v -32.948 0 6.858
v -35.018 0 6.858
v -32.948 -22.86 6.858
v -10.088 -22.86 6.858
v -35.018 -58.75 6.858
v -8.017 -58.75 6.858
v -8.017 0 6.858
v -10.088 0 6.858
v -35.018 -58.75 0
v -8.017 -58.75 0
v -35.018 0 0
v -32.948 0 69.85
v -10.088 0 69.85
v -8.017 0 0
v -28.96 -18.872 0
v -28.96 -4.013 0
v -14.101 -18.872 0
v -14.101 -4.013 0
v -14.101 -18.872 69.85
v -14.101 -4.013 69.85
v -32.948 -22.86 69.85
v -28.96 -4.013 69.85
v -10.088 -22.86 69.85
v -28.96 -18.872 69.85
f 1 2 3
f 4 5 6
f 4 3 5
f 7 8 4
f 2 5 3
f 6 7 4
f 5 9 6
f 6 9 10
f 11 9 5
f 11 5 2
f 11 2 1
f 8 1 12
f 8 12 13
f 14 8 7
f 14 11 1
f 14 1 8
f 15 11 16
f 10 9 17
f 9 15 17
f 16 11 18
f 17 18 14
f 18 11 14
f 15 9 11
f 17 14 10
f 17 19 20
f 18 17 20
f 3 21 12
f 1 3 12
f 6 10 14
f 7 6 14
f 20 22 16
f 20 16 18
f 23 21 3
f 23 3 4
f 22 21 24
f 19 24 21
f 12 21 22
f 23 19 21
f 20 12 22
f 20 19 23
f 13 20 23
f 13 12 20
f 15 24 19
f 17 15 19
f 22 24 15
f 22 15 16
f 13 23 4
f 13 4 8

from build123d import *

# Parameters (mm, degrees)
F0_W     = 27.0002
F0_H     = 58.7502
F1_DEPTH = 6.858
F2_W     = 11.43
F2_H     = 22.86
F3_DEPTH = 69.85
F4_W     = 14.859
F4_H     = 14.859
F5_DEPTH = 76.2


with BuildPart() as f1:
    # F0 (on Top) → F1 (new body)
    with BuildSketch(Plane.XY):
        with Locations((-21.517536, -29.3751)):
            Rectangle(F0_W, F0_H)
    extrude(amount=F1_DEPTH)

    # F2 (on Top) → F3 (join)
    with BuildSketch(Plane.XY):
        with Locations((-27.232536, -11.43)):
            Rectangle(F2_W, F2_H)
        with Locations((-15.802536, -11.43)):
            Rectangle(F2_W, F2_H)
    extrude(amount=F3_DEPTH)

    # F4 (on face) → F5 (cut)
    with BuildSketch(Plane.XY.offset(69.85)):
        with Locations((-21.530236, -11.4427)):
            Rectangle(F4_W, F4_H)
    extrude(amount=-F5_DEPTH, mode=Mode.SUBTRACT)


solid = f1.part
